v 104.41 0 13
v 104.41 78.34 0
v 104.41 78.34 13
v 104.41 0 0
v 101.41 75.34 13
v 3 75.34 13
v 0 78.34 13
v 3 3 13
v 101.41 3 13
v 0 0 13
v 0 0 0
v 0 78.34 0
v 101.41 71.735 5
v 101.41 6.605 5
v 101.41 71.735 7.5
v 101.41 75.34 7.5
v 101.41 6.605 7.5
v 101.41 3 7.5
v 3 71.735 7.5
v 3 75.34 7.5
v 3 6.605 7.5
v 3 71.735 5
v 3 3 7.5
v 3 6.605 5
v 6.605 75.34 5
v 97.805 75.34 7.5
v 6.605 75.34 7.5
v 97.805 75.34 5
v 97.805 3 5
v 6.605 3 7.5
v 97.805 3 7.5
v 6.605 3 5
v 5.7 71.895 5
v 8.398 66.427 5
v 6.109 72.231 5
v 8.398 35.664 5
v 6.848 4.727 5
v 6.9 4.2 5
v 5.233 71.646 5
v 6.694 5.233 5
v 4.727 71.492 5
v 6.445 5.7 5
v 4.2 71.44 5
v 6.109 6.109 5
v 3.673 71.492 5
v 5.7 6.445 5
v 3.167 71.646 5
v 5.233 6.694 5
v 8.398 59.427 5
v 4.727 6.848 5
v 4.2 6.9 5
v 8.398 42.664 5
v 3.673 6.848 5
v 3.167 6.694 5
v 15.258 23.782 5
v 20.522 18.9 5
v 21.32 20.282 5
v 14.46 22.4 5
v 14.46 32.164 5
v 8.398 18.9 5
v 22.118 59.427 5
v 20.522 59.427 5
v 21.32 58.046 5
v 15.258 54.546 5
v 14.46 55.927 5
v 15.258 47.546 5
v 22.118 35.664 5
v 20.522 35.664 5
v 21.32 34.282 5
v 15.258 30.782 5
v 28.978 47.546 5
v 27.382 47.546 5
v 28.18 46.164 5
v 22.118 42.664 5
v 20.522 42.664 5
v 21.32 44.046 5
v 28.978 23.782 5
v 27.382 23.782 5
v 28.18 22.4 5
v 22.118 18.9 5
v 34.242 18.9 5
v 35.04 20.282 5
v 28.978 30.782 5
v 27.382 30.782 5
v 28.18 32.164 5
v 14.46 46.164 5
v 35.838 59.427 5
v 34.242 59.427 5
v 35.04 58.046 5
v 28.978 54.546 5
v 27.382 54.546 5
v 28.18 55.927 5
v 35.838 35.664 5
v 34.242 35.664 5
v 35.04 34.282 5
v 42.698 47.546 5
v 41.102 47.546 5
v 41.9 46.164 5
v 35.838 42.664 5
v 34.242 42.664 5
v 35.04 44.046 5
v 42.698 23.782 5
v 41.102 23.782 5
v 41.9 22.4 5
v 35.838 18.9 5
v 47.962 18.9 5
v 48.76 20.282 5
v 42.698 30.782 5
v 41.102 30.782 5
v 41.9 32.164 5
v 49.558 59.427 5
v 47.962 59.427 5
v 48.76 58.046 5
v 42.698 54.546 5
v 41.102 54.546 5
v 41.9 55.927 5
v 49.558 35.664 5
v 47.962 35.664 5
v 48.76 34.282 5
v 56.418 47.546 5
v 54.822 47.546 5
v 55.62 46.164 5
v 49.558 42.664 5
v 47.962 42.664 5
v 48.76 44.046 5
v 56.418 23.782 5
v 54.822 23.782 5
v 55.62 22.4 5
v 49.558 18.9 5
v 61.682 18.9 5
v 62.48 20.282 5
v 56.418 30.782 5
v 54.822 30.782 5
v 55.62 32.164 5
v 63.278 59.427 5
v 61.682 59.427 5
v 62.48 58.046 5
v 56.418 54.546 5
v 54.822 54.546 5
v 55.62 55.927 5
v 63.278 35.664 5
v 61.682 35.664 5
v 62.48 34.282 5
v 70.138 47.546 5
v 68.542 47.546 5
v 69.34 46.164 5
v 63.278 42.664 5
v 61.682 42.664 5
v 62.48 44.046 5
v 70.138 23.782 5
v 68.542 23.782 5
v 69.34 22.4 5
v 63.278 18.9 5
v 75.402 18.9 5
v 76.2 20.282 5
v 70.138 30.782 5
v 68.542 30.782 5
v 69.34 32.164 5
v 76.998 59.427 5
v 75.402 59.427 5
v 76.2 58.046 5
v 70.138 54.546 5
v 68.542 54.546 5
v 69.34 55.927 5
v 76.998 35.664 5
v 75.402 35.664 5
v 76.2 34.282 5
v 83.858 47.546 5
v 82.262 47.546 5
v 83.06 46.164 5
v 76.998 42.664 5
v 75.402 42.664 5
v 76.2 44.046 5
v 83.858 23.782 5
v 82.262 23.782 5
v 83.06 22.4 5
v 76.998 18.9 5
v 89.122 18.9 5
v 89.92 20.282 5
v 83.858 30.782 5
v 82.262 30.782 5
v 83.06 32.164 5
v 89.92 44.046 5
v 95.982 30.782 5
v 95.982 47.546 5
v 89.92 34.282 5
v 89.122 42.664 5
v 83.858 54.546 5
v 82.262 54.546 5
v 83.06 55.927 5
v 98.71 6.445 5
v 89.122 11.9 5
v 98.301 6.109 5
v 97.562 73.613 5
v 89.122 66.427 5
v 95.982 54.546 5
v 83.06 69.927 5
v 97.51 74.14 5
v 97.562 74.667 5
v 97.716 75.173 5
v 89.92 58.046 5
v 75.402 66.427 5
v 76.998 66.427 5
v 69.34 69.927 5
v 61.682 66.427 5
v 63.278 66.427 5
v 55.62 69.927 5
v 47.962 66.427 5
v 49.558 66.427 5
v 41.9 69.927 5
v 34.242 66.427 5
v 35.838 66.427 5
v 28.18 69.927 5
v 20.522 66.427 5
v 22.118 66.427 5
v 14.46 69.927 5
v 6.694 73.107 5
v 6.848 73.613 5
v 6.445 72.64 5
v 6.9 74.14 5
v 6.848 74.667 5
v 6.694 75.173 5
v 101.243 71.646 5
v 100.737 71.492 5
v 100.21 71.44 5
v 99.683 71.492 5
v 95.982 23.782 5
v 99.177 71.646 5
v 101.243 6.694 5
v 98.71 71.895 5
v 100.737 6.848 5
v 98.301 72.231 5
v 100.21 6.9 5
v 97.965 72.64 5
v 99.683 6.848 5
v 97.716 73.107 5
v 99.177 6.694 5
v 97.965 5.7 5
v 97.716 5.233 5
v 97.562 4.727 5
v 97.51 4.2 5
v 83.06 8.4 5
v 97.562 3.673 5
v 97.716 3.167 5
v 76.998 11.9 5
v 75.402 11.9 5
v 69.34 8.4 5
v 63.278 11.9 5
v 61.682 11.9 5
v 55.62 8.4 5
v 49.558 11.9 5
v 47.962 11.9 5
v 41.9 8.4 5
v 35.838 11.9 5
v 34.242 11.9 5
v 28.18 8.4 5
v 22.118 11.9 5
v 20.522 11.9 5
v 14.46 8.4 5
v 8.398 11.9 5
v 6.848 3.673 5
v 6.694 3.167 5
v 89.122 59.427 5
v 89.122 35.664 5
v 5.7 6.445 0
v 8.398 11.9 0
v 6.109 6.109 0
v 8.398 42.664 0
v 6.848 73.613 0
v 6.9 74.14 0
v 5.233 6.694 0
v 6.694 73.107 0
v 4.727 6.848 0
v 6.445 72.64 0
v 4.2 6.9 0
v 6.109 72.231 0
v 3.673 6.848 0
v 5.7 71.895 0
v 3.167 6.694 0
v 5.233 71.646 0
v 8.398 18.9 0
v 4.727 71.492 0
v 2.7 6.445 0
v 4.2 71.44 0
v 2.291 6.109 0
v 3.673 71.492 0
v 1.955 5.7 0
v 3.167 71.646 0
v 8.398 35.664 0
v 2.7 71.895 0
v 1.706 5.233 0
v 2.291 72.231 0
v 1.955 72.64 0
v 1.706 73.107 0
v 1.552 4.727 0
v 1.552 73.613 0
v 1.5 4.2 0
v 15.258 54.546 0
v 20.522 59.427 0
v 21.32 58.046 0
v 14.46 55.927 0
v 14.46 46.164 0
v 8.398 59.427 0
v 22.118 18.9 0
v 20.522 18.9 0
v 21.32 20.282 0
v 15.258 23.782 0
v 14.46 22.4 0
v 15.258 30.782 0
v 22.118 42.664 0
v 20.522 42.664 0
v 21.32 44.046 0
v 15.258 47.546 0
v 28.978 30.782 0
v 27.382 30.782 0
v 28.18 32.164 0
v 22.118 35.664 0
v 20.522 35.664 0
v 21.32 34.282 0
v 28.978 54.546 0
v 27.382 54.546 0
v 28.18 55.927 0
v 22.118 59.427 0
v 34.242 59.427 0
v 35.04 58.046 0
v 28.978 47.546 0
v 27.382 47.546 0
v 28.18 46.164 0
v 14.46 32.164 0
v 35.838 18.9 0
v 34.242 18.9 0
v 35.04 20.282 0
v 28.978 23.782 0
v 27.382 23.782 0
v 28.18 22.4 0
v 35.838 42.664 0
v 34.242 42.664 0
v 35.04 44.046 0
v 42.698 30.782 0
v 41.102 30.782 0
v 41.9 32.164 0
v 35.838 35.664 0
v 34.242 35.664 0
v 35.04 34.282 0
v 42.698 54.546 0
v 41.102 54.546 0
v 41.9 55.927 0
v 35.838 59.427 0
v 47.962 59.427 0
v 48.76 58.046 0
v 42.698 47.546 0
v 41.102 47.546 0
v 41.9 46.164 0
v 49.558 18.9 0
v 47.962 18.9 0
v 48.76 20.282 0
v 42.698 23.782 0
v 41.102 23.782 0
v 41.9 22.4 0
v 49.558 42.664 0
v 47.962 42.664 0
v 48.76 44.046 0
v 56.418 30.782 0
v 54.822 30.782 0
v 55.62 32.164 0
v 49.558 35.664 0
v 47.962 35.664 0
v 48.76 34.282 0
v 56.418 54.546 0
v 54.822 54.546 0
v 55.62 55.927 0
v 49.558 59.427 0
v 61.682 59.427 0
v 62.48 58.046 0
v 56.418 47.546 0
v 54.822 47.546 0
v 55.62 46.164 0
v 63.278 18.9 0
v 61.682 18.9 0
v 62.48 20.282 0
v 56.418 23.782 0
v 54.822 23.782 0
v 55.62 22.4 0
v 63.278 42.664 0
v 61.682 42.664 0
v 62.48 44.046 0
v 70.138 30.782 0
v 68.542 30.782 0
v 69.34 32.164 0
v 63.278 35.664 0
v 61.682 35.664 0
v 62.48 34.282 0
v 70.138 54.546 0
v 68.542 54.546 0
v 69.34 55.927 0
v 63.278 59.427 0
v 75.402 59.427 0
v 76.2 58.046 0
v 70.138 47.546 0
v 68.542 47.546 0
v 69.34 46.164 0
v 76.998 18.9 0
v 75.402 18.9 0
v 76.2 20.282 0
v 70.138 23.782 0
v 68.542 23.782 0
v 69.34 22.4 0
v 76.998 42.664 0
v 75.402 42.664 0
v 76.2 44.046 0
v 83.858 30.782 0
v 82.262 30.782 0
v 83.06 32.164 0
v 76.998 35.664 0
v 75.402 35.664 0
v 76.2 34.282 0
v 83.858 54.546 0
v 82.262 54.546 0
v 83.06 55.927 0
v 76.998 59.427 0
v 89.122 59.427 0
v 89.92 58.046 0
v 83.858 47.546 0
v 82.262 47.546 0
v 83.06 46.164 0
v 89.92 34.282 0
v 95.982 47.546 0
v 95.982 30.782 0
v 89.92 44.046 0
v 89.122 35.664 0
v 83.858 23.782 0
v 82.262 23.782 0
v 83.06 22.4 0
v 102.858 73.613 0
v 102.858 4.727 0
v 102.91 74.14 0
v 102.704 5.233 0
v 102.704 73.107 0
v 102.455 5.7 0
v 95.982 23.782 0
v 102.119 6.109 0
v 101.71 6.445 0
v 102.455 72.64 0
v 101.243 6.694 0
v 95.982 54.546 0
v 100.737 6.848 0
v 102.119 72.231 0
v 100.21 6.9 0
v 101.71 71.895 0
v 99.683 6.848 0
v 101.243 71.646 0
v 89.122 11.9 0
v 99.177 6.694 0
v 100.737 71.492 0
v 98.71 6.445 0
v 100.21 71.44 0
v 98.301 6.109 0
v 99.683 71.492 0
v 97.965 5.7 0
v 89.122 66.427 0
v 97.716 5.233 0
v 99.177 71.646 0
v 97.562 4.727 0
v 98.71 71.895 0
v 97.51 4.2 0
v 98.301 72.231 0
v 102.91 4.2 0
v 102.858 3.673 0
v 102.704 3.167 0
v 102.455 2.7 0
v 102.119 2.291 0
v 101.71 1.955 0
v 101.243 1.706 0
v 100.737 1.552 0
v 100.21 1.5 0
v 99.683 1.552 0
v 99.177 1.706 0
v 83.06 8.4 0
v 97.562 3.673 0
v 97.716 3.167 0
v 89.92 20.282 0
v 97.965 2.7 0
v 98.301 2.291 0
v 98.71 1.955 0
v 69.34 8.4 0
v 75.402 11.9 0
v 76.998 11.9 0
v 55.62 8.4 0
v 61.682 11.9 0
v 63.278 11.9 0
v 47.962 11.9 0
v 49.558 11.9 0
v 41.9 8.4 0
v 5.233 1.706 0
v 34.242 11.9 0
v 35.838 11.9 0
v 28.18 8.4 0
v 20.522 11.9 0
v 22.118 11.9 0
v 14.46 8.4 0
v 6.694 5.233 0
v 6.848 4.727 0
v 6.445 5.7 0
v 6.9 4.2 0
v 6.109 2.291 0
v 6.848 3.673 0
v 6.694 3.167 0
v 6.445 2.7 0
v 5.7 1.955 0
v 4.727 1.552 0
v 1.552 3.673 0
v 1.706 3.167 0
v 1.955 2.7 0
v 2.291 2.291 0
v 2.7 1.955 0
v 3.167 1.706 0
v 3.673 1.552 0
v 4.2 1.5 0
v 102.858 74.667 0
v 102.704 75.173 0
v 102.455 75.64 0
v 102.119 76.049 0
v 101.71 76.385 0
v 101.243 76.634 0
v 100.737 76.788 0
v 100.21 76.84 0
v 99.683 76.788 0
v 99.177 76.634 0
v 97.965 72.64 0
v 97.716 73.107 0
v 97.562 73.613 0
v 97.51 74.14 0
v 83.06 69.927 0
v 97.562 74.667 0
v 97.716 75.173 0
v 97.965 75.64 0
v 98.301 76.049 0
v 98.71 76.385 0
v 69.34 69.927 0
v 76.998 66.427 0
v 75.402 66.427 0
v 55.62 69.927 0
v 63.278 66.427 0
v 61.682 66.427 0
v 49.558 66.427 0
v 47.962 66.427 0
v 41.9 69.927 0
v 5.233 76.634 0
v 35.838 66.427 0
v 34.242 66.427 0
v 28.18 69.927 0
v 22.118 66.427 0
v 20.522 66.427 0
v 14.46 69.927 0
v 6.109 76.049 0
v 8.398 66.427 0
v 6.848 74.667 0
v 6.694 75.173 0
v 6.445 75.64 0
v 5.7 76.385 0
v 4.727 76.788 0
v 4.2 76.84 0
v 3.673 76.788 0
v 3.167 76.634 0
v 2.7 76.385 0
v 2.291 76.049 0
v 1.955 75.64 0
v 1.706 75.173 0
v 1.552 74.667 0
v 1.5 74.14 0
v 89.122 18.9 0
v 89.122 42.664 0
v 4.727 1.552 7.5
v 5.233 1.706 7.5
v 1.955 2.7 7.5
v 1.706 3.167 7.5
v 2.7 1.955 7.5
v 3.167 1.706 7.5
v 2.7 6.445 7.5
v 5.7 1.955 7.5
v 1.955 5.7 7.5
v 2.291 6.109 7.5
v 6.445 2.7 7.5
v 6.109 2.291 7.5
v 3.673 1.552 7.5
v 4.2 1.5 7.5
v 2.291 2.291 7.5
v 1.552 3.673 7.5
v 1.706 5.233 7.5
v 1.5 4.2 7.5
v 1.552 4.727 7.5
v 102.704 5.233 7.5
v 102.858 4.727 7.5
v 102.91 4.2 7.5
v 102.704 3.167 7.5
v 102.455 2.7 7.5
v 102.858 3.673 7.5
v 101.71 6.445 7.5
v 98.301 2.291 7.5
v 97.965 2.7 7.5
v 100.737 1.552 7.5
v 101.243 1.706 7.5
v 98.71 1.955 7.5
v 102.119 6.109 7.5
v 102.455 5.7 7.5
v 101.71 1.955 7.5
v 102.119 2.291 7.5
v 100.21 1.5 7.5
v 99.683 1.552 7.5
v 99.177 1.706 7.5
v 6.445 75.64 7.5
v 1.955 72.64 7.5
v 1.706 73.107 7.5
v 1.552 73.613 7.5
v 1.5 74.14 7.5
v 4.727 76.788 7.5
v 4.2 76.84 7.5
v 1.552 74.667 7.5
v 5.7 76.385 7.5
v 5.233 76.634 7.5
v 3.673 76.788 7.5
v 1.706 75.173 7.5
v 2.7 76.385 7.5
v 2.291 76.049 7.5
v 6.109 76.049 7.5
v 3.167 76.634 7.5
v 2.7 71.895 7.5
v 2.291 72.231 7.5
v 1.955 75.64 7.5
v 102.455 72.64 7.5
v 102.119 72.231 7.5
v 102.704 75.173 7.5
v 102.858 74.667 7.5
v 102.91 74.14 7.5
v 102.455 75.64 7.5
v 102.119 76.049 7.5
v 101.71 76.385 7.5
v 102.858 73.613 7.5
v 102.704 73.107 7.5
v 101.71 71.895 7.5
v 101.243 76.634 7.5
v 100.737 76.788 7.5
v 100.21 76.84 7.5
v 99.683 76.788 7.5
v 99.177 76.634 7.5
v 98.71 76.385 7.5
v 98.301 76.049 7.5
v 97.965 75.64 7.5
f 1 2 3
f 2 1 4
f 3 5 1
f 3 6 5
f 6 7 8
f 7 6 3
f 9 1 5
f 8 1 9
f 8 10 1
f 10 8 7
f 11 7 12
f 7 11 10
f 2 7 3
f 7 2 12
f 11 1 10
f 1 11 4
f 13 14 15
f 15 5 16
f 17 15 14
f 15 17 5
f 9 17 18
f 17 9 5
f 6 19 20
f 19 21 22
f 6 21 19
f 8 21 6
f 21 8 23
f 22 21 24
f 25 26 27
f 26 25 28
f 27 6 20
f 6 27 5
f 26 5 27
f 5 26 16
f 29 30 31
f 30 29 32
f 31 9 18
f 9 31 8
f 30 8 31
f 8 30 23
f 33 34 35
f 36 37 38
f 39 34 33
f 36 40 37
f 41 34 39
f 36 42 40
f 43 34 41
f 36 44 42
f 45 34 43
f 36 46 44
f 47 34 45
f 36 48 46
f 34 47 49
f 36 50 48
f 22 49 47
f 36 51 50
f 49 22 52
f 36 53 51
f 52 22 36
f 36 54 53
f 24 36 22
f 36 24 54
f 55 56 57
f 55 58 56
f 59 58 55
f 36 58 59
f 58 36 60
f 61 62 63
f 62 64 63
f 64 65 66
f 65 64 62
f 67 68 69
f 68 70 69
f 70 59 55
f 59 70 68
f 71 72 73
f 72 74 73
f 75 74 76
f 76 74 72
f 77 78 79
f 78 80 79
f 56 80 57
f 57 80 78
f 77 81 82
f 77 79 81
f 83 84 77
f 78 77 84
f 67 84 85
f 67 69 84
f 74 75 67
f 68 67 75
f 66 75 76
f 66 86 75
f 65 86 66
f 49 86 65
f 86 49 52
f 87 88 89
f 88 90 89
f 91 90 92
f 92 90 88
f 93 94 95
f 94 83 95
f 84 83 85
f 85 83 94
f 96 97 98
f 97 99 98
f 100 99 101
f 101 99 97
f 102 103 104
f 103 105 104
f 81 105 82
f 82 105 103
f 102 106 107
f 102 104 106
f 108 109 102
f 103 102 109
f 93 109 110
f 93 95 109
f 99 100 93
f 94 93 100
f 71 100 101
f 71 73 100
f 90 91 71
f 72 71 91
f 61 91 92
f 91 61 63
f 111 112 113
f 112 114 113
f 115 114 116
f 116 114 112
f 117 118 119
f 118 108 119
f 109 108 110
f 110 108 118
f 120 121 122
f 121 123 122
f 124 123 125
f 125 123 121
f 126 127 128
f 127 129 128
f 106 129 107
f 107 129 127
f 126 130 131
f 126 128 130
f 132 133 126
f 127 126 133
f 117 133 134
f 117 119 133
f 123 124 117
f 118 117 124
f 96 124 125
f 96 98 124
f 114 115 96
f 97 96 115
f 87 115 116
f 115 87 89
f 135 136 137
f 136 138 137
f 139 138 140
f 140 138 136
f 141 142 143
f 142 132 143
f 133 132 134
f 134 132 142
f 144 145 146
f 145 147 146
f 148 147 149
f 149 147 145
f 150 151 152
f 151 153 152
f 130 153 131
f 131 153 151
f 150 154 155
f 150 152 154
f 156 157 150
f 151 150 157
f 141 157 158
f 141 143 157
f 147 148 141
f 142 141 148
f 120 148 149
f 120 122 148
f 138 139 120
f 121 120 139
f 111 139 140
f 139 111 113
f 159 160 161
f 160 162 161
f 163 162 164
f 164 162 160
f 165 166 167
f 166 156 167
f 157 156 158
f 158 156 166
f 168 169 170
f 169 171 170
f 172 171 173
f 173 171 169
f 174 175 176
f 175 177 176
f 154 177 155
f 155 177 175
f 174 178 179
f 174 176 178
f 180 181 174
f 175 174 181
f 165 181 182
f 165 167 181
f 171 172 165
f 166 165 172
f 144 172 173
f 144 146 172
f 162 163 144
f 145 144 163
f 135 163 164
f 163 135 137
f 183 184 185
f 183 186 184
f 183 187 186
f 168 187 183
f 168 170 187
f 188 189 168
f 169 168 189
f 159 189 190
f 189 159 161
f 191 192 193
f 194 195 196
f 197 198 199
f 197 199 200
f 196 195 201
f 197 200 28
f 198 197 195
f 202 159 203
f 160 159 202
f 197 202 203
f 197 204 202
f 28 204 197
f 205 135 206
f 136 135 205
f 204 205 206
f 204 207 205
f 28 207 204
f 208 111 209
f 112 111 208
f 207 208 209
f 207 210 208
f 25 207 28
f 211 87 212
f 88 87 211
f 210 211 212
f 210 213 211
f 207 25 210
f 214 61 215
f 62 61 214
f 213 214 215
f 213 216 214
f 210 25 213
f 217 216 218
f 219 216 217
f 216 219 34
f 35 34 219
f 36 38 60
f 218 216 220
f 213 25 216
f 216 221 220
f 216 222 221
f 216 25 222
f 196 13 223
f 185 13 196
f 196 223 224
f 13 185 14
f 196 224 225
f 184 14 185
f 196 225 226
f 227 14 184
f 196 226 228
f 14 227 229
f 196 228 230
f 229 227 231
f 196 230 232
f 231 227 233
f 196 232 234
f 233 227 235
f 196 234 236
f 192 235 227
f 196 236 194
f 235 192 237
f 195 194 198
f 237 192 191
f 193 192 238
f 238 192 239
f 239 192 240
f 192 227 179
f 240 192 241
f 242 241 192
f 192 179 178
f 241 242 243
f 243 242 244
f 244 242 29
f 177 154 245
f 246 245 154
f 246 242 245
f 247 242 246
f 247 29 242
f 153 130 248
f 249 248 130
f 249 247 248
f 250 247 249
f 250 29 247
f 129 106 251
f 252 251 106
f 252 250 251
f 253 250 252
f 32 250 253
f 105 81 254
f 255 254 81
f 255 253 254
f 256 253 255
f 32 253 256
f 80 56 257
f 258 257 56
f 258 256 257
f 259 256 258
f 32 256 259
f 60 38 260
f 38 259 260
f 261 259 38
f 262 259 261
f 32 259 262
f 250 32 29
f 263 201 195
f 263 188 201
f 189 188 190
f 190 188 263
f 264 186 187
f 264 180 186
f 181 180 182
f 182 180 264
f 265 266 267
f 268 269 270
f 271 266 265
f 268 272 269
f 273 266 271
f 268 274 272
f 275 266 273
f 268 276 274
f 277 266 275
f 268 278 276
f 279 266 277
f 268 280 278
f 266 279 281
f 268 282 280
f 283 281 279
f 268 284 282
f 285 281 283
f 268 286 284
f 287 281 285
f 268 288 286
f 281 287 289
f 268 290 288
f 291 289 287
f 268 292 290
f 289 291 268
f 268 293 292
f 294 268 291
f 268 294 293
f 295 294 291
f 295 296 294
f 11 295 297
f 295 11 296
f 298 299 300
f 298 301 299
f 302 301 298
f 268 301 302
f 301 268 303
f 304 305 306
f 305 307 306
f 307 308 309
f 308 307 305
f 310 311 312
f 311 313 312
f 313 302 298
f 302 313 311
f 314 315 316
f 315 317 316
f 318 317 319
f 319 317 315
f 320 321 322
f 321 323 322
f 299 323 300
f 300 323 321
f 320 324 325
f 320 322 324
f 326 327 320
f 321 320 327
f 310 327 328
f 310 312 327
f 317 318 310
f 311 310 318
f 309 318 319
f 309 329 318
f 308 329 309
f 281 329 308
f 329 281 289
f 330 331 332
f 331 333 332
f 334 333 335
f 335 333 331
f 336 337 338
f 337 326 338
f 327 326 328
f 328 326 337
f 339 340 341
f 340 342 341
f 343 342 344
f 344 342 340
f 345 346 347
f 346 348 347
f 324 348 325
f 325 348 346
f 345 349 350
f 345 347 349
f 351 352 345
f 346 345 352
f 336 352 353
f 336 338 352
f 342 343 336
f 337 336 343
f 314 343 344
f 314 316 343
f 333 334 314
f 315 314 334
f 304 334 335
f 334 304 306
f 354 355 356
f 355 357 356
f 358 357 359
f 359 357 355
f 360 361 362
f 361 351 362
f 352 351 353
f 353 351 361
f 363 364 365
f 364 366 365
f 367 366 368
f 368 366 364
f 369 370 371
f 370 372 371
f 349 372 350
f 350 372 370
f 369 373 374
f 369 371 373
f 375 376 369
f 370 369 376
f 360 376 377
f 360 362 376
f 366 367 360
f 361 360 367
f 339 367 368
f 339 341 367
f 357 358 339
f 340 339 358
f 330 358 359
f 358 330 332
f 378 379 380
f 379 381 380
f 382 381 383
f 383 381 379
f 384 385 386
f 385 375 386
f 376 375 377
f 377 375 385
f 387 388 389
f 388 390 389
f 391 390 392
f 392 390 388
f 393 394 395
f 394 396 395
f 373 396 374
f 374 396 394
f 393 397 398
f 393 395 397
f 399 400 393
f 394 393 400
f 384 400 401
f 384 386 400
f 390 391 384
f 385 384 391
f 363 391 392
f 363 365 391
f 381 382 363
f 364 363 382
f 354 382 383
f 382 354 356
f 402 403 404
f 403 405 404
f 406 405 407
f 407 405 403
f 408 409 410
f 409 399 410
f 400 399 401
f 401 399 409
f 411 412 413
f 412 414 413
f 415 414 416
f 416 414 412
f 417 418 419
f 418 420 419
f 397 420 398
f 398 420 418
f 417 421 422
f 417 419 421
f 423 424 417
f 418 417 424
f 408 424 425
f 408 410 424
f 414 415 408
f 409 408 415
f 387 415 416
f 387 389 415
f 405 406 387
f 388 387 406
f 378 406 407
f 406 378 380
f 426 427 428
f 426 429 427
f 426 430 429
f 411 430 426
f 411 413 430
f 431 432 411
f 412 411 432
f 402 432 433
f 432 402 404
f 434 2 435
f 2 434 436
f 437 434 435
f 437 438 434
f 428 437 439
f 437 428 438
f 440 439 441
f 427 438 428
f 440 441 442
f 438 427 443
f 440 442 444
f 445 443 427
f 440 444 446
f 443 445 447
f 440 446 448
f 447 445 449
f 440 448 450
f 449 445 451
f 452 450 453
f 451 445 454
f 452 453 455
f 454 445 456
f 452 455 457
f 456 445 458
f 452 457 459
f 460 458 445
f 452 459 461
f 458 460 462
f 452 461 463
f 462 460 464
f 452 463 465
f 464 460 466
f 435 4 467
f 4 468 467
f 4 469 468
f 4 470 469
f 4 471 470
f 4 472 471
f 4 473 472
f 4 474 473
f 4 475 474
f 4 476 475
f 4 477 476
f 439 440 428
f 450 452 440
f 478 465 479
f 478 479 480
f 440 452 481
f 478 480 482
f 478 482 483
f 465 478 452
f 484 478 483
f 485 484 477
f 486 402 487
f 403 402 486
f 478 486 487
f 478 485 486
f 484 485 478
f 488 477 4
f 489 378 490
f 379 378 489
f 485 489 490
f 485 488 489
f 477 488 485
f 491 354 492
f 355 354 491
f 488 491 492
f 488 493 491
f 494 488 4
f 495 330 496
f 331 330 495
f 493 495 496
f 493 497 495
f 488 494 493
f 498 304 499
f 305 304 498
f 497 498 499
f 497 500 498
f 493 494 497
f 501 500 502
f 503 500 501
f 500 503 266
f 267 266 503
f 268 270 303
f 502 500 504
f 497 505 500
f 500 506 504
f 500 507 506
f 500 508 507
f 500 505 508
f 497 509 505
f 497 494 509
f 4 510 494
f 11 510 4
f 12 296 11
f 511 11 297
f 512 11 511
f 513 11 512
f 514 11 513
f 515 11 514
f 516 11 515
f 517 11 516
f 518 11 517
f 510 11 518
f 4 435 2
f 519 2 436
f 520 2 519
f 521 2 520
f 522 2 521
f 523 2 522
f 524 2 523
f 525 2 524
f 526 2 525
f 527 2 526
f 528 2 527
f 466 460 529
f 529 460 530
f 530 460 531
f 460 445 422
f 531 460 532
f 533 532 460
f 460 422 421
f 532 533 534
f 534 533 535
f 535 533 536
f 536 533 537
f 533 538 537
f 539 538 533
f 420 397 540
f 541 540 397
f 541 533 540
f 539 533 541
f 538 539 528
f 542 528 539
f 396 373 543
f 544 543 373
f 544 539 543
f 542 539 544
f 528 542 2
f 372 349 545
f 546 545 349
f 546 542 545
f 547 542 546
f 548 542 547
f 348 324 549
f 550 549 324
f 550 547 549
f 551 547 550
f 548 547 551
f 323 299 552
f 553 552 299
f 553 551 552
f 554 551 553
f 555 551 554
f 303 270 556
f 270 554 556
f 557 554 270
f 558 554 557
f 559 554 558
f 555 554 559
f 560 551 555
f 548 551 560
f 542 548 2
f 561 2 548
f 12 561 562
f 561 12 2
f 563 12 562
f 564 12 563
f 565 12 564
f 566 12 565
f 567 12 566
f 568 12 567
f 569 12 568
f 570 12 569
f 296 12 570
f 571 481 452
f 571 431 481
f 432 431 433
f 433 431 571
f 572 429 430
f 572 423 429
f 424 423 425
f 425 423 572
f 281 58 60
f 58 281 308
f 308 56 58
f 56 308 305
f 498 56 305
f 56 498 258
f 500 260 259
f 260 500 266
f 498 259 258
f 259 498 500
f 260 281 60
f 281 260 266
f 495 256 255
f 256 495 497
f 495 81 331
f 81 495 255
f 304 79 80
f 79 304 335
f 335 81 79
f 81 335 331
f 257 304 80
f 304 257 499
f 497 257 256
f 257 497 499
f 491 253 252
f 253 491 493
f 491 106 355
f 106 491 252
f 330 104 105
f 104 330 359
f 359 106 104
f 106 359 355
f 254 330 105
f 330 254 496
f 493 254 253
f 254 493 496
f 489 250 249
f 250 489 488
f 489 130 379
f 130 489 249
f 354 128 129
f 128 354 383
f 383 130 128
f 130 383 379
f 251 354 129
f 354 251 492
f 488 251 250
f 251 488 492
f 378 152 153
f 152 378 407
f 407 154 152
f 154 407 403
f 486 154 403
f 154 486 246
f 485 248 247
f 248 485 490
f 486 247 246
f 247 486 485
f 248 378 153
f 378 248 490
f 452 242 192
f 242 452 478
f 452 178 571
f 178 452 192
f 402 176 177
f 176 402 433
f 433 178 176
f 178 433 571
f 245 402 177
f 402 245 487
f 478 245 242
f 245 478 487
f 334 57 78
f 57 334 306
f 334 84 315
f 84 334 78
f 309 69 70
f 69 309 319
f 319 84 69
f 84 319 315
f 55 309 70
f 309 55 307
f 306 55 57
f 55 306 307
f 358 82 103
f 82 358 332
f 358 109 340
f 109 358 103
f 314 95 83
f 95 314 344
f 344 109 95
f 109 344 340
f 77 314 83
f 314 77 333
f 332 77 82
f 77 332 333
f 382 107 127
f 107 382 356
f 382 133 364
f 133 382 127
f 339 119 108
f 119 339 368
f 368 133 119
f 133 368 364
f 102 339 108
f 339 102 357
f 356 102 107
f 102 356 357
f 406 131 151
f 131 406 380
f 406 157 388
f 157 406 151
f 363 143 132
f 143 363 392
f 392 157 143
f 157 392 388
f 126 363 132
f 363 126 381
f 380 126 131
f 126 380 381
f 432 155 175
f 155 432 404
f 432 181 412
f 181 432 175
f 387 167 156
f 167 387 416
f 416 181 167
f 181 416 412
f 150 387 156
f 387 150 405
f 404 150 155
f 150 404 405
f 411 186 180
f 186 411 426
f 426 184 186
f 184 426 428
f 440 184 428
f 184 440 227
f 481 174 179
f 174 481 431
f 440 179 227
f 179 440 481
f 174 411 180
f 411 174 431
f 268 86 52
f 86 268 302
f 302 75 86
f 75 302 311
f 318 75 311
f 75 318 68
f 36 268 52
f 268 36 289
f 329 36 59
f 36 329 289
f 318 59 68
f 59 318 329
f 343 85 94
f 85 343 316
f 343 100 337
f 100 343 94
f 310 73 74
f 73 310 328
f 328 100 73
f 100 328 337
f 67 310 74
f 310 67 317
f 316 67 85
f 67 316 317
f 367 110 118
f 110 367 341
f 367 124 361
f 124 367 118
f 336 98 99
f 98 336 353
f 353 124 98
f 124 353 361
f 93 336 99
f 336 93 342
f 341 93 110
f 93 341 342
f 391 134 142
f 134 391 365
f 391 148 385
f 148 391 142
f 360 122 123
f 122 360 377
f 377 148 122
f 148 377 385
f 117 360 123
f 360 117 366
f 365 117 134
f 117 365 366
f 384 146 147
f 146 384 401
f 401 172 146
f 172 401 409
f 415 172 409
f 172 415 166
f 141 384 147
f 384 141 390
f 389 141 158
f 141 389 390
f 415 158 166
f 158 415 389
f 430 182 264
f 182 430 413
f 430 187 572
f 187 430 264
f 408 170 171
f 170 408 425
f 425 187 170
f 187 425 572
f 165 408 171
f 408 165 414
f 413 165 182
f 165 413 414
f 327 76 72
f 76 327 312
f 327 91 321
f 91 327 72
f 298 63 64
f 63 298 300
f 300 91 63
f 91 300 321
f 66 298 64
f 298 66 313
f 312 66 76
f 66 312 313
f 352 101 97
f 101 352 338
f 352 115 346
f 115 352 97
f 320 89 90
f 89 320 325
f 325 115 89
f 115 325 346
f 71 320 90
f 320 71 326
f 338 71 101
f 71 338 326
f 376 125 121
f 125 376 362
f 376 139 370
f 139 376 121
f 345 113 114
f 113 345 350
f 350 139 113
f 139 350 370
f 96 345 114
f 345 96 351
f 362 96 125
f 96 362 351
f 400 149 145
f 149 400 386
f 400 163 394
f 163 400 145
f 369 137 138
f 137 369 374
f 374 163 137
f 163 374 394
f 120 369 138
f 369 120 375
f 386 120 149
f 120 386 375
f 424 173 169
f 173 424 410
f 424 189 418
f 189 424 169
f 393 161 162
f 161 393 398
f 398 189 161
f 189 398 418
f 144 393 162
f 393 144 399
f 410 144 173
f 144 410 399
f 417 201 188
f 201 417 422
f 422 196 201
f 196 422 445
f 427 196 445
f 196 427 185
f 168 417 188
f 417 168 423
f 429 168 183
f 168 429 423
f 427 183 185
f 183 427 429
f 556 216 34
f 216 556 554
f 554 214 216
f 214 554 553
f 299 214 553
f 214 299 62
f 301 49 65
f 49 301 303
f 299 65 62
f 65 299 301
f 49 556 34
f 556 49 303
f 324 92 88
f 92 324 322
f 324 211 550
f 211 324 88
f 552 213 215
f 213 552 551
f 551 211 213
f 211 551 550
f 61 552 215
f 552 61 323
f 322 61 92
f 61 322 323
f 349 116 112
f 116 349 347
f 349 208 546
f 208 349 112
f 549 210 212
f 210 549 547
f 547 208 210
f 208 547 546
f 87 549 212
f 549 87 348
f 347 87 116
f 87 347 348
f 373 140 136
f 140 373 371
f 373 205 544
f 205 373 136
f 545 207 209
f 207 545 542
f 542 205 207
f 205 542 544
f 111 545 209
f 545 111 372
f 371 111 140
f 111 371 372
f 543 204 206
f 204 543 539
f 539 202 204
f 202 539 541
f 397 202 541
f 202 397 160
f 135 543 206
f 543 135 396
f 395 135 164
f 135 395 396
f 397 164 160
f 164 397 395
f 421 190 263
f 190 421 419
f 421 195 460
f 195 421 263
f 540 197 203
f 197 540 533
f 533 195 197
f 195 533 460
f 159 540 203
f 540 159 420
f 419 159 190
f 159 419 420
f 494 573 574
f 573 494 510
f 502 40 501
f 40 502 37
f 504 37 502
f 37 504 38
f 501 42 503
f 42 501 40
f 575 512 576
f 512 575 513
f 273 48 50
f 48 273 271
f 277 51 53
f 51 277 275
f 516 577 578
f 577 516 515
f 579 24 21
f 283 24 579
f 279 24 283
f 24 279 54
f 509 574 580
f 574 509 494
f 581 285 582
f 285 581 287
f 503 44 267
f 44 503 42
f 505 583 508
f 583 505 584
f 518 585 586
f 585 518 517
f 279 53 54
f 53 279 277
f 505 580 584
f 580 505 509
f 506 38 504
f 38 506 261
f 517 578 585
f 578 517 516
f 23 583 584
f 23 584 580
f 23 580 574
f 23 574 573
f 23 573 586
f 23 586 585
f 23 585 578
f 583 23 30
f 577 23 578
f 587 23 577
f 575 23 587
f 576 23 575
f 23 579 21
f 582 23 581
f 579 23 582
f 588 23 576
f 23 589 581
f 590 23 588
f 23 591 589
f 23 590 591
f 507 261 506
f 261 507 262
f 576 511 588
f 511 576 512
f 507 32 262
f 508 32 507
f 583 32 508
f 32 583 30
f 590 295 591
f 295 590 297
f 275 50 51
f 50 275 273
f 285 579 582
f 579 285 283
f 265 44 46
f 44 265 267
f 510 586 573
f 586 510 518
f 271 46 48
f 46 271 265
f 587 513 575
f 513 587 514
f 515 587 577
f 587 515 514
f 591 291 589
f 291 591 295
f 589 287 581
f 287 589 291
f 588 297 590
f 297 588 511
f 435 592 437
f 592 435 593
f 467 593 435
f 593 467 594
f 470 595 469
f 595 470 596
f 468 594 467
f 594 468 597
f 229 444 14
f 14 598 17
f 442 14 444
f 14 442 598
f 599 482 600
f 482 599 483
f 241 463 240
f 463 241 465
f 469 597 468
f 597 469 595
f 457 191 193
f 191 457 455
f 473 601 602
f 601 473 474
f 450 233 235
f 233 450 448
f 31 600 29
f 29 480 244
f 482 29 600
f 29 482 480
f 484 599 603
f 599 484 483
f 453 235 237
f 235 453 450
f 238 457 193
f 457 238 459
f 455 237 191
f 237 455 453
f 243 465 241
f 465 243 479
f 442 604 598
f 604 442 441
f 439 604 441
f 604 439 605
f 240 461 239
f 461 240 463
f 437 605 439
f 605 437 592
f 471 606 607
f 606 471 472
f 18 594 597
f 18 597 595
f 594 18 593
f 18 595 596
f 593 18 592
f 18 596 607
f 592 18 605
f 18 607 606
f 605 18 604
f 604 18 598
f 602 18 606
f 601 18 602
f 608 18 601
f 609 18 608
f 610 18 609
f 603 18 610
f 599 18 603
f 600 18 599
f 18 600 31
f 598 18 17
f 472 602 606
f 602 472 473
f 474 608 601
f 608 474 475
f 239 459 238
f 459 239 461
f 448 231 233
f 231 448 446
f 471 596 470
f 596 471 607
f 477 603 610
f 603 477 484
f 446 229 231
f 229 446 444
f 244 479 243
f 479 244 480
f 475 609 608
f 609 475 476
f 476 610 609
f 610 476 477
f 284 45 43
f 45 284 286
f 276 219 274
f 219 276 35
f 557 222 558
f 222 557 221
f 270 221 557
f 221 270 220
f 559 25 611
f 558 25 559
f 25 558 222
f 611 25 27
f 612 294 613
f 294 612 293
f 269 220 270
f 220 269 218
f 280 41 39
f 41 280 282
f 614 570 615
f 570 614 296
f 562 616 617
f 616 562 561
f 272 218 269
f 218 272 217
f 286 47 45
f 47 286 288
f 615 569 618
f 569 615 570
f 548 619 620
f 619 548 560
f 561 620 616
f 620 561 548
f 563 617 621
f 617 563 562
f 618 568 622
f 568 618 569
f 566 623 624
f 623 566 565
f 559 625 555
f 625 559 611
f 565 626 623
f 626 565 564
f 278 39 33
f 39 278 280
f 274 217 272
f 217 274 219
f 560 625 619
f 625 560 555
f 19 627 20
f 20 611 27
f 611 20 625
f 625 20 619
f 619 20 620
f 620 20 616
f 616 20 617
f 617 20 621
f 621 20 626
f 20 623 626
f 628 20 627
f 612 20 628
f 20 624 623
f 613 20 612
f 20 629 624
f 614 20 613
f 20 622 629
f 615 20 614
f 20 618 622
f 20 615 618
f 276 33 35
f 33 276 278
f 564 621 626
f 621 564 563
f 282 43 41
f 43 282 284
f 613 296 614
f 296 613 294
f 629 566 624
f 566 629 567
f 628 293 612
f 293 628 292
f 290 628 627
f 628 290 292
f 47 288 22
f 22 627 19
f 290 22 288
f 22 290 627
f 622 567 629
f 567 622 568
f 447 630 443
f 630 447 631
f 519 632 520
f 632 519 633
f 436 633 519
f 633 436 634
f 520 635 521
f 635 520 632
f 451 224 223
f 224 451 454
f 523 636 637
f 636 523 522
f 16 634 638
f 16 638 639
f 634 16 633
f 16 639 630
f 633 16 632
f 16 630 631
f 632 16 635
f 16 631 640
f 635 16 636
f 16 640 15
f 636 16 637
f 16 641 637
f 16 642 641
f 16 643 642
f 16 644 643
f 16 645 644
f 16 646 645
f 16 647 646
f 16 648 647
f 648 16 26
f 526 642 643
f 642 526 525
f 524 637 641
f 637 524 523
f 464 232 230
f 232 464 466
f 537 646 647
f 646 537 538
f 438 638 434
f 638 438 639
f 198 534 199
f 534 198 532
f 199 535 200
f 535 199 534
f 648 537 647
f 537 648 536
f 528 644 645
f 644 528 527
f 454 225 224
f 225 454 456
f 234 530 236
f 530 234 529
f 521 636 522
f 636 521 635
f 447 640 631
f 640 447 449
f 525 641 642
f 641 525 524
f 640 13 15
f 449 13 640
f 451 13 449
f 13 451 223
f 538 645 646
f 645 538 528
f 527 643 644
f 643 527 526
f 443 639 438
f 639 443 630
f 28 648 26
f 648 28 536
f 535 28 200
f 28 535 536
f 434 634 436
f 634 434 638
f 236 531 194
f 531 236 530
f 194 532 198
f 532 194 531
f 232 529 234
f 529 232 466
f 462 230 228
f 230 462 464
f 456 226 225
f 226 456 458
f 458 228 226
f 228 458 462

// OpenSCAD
$fn = 32;

// ----------------------------------------------------------------------
// Honeycomb panel: 104.41 x 78.34 mm, 30 cells of 14 mm
// ----------------------------------------------------------------------

// --- parameters (mm) ---
panel_w = 104.41;         // panel width
panel_d = 78.34;          // panel depth
thick = 5;                // panel thickness
cell_r = 7;               // hex cell circumradius
pitch = 13.72;            // hex cell pitch (centre to centre)
web = 1.6;                // web between the cells
columns = 6;              // columns of cells
rows = 5;                 // rows of cells
cell_count = 30;          // total cells
shift_x = 14.46;          // first cell offset in x
shift_y = 15.4;           // first cell offset in y
mount_d = 5.4;            // corner mounting holes
hole_off = 4.2;           // mounting hole offset from the corners
rim_h = 13;               // rim height
rim_t = 3;                // rim wall thickness

difference() {
  union() {
    cube([panel_w, panel_d, thick]);
    /* rim around the panel, sunk 1 mm into the plate */
    translate([0, 0, thick - 1]) difference() {
      cube([panel_w, panel_d, rim_h - thick + 1]);
      translate([rim_t, rim_t, -2.5]) cube([panel_w - 2 * rim_t, panel_d - 2 * rim_t, rim_h - thick + 6]);
    }
  }
  /* hexagonal cells, point-up, cut right through the plate */
  for (row = [0 : rows - 1]) {
    for (col = [0 : columns - 1]) {
      translate([shift_x + col * pitch + (row % 2) * pitch / 2, shift_y + row * pitch * 0.866025, -2.5]) rotate([0, 0, 30]) cylinder(h = thick + 5, d = 2 * cell_r, $fn = 6);
    }
  }
  /* corner mounting holes, clear of the outer cell web */
  translate([4.2, 4.2, -2.5]) cylinder(h = thick + 5, d = mount_d);
  translate([100.21, 4.2, -2.5]) cylinder(h = thick + 5, d = mount_d);
  translate([4.2, 74.14, -2.5]) cylinder(h = thick + 5, d = mount_d);
  translate([100.21, 74.14, -2.5]) cylinder(h = thick + 5, d = mount_d);
}
